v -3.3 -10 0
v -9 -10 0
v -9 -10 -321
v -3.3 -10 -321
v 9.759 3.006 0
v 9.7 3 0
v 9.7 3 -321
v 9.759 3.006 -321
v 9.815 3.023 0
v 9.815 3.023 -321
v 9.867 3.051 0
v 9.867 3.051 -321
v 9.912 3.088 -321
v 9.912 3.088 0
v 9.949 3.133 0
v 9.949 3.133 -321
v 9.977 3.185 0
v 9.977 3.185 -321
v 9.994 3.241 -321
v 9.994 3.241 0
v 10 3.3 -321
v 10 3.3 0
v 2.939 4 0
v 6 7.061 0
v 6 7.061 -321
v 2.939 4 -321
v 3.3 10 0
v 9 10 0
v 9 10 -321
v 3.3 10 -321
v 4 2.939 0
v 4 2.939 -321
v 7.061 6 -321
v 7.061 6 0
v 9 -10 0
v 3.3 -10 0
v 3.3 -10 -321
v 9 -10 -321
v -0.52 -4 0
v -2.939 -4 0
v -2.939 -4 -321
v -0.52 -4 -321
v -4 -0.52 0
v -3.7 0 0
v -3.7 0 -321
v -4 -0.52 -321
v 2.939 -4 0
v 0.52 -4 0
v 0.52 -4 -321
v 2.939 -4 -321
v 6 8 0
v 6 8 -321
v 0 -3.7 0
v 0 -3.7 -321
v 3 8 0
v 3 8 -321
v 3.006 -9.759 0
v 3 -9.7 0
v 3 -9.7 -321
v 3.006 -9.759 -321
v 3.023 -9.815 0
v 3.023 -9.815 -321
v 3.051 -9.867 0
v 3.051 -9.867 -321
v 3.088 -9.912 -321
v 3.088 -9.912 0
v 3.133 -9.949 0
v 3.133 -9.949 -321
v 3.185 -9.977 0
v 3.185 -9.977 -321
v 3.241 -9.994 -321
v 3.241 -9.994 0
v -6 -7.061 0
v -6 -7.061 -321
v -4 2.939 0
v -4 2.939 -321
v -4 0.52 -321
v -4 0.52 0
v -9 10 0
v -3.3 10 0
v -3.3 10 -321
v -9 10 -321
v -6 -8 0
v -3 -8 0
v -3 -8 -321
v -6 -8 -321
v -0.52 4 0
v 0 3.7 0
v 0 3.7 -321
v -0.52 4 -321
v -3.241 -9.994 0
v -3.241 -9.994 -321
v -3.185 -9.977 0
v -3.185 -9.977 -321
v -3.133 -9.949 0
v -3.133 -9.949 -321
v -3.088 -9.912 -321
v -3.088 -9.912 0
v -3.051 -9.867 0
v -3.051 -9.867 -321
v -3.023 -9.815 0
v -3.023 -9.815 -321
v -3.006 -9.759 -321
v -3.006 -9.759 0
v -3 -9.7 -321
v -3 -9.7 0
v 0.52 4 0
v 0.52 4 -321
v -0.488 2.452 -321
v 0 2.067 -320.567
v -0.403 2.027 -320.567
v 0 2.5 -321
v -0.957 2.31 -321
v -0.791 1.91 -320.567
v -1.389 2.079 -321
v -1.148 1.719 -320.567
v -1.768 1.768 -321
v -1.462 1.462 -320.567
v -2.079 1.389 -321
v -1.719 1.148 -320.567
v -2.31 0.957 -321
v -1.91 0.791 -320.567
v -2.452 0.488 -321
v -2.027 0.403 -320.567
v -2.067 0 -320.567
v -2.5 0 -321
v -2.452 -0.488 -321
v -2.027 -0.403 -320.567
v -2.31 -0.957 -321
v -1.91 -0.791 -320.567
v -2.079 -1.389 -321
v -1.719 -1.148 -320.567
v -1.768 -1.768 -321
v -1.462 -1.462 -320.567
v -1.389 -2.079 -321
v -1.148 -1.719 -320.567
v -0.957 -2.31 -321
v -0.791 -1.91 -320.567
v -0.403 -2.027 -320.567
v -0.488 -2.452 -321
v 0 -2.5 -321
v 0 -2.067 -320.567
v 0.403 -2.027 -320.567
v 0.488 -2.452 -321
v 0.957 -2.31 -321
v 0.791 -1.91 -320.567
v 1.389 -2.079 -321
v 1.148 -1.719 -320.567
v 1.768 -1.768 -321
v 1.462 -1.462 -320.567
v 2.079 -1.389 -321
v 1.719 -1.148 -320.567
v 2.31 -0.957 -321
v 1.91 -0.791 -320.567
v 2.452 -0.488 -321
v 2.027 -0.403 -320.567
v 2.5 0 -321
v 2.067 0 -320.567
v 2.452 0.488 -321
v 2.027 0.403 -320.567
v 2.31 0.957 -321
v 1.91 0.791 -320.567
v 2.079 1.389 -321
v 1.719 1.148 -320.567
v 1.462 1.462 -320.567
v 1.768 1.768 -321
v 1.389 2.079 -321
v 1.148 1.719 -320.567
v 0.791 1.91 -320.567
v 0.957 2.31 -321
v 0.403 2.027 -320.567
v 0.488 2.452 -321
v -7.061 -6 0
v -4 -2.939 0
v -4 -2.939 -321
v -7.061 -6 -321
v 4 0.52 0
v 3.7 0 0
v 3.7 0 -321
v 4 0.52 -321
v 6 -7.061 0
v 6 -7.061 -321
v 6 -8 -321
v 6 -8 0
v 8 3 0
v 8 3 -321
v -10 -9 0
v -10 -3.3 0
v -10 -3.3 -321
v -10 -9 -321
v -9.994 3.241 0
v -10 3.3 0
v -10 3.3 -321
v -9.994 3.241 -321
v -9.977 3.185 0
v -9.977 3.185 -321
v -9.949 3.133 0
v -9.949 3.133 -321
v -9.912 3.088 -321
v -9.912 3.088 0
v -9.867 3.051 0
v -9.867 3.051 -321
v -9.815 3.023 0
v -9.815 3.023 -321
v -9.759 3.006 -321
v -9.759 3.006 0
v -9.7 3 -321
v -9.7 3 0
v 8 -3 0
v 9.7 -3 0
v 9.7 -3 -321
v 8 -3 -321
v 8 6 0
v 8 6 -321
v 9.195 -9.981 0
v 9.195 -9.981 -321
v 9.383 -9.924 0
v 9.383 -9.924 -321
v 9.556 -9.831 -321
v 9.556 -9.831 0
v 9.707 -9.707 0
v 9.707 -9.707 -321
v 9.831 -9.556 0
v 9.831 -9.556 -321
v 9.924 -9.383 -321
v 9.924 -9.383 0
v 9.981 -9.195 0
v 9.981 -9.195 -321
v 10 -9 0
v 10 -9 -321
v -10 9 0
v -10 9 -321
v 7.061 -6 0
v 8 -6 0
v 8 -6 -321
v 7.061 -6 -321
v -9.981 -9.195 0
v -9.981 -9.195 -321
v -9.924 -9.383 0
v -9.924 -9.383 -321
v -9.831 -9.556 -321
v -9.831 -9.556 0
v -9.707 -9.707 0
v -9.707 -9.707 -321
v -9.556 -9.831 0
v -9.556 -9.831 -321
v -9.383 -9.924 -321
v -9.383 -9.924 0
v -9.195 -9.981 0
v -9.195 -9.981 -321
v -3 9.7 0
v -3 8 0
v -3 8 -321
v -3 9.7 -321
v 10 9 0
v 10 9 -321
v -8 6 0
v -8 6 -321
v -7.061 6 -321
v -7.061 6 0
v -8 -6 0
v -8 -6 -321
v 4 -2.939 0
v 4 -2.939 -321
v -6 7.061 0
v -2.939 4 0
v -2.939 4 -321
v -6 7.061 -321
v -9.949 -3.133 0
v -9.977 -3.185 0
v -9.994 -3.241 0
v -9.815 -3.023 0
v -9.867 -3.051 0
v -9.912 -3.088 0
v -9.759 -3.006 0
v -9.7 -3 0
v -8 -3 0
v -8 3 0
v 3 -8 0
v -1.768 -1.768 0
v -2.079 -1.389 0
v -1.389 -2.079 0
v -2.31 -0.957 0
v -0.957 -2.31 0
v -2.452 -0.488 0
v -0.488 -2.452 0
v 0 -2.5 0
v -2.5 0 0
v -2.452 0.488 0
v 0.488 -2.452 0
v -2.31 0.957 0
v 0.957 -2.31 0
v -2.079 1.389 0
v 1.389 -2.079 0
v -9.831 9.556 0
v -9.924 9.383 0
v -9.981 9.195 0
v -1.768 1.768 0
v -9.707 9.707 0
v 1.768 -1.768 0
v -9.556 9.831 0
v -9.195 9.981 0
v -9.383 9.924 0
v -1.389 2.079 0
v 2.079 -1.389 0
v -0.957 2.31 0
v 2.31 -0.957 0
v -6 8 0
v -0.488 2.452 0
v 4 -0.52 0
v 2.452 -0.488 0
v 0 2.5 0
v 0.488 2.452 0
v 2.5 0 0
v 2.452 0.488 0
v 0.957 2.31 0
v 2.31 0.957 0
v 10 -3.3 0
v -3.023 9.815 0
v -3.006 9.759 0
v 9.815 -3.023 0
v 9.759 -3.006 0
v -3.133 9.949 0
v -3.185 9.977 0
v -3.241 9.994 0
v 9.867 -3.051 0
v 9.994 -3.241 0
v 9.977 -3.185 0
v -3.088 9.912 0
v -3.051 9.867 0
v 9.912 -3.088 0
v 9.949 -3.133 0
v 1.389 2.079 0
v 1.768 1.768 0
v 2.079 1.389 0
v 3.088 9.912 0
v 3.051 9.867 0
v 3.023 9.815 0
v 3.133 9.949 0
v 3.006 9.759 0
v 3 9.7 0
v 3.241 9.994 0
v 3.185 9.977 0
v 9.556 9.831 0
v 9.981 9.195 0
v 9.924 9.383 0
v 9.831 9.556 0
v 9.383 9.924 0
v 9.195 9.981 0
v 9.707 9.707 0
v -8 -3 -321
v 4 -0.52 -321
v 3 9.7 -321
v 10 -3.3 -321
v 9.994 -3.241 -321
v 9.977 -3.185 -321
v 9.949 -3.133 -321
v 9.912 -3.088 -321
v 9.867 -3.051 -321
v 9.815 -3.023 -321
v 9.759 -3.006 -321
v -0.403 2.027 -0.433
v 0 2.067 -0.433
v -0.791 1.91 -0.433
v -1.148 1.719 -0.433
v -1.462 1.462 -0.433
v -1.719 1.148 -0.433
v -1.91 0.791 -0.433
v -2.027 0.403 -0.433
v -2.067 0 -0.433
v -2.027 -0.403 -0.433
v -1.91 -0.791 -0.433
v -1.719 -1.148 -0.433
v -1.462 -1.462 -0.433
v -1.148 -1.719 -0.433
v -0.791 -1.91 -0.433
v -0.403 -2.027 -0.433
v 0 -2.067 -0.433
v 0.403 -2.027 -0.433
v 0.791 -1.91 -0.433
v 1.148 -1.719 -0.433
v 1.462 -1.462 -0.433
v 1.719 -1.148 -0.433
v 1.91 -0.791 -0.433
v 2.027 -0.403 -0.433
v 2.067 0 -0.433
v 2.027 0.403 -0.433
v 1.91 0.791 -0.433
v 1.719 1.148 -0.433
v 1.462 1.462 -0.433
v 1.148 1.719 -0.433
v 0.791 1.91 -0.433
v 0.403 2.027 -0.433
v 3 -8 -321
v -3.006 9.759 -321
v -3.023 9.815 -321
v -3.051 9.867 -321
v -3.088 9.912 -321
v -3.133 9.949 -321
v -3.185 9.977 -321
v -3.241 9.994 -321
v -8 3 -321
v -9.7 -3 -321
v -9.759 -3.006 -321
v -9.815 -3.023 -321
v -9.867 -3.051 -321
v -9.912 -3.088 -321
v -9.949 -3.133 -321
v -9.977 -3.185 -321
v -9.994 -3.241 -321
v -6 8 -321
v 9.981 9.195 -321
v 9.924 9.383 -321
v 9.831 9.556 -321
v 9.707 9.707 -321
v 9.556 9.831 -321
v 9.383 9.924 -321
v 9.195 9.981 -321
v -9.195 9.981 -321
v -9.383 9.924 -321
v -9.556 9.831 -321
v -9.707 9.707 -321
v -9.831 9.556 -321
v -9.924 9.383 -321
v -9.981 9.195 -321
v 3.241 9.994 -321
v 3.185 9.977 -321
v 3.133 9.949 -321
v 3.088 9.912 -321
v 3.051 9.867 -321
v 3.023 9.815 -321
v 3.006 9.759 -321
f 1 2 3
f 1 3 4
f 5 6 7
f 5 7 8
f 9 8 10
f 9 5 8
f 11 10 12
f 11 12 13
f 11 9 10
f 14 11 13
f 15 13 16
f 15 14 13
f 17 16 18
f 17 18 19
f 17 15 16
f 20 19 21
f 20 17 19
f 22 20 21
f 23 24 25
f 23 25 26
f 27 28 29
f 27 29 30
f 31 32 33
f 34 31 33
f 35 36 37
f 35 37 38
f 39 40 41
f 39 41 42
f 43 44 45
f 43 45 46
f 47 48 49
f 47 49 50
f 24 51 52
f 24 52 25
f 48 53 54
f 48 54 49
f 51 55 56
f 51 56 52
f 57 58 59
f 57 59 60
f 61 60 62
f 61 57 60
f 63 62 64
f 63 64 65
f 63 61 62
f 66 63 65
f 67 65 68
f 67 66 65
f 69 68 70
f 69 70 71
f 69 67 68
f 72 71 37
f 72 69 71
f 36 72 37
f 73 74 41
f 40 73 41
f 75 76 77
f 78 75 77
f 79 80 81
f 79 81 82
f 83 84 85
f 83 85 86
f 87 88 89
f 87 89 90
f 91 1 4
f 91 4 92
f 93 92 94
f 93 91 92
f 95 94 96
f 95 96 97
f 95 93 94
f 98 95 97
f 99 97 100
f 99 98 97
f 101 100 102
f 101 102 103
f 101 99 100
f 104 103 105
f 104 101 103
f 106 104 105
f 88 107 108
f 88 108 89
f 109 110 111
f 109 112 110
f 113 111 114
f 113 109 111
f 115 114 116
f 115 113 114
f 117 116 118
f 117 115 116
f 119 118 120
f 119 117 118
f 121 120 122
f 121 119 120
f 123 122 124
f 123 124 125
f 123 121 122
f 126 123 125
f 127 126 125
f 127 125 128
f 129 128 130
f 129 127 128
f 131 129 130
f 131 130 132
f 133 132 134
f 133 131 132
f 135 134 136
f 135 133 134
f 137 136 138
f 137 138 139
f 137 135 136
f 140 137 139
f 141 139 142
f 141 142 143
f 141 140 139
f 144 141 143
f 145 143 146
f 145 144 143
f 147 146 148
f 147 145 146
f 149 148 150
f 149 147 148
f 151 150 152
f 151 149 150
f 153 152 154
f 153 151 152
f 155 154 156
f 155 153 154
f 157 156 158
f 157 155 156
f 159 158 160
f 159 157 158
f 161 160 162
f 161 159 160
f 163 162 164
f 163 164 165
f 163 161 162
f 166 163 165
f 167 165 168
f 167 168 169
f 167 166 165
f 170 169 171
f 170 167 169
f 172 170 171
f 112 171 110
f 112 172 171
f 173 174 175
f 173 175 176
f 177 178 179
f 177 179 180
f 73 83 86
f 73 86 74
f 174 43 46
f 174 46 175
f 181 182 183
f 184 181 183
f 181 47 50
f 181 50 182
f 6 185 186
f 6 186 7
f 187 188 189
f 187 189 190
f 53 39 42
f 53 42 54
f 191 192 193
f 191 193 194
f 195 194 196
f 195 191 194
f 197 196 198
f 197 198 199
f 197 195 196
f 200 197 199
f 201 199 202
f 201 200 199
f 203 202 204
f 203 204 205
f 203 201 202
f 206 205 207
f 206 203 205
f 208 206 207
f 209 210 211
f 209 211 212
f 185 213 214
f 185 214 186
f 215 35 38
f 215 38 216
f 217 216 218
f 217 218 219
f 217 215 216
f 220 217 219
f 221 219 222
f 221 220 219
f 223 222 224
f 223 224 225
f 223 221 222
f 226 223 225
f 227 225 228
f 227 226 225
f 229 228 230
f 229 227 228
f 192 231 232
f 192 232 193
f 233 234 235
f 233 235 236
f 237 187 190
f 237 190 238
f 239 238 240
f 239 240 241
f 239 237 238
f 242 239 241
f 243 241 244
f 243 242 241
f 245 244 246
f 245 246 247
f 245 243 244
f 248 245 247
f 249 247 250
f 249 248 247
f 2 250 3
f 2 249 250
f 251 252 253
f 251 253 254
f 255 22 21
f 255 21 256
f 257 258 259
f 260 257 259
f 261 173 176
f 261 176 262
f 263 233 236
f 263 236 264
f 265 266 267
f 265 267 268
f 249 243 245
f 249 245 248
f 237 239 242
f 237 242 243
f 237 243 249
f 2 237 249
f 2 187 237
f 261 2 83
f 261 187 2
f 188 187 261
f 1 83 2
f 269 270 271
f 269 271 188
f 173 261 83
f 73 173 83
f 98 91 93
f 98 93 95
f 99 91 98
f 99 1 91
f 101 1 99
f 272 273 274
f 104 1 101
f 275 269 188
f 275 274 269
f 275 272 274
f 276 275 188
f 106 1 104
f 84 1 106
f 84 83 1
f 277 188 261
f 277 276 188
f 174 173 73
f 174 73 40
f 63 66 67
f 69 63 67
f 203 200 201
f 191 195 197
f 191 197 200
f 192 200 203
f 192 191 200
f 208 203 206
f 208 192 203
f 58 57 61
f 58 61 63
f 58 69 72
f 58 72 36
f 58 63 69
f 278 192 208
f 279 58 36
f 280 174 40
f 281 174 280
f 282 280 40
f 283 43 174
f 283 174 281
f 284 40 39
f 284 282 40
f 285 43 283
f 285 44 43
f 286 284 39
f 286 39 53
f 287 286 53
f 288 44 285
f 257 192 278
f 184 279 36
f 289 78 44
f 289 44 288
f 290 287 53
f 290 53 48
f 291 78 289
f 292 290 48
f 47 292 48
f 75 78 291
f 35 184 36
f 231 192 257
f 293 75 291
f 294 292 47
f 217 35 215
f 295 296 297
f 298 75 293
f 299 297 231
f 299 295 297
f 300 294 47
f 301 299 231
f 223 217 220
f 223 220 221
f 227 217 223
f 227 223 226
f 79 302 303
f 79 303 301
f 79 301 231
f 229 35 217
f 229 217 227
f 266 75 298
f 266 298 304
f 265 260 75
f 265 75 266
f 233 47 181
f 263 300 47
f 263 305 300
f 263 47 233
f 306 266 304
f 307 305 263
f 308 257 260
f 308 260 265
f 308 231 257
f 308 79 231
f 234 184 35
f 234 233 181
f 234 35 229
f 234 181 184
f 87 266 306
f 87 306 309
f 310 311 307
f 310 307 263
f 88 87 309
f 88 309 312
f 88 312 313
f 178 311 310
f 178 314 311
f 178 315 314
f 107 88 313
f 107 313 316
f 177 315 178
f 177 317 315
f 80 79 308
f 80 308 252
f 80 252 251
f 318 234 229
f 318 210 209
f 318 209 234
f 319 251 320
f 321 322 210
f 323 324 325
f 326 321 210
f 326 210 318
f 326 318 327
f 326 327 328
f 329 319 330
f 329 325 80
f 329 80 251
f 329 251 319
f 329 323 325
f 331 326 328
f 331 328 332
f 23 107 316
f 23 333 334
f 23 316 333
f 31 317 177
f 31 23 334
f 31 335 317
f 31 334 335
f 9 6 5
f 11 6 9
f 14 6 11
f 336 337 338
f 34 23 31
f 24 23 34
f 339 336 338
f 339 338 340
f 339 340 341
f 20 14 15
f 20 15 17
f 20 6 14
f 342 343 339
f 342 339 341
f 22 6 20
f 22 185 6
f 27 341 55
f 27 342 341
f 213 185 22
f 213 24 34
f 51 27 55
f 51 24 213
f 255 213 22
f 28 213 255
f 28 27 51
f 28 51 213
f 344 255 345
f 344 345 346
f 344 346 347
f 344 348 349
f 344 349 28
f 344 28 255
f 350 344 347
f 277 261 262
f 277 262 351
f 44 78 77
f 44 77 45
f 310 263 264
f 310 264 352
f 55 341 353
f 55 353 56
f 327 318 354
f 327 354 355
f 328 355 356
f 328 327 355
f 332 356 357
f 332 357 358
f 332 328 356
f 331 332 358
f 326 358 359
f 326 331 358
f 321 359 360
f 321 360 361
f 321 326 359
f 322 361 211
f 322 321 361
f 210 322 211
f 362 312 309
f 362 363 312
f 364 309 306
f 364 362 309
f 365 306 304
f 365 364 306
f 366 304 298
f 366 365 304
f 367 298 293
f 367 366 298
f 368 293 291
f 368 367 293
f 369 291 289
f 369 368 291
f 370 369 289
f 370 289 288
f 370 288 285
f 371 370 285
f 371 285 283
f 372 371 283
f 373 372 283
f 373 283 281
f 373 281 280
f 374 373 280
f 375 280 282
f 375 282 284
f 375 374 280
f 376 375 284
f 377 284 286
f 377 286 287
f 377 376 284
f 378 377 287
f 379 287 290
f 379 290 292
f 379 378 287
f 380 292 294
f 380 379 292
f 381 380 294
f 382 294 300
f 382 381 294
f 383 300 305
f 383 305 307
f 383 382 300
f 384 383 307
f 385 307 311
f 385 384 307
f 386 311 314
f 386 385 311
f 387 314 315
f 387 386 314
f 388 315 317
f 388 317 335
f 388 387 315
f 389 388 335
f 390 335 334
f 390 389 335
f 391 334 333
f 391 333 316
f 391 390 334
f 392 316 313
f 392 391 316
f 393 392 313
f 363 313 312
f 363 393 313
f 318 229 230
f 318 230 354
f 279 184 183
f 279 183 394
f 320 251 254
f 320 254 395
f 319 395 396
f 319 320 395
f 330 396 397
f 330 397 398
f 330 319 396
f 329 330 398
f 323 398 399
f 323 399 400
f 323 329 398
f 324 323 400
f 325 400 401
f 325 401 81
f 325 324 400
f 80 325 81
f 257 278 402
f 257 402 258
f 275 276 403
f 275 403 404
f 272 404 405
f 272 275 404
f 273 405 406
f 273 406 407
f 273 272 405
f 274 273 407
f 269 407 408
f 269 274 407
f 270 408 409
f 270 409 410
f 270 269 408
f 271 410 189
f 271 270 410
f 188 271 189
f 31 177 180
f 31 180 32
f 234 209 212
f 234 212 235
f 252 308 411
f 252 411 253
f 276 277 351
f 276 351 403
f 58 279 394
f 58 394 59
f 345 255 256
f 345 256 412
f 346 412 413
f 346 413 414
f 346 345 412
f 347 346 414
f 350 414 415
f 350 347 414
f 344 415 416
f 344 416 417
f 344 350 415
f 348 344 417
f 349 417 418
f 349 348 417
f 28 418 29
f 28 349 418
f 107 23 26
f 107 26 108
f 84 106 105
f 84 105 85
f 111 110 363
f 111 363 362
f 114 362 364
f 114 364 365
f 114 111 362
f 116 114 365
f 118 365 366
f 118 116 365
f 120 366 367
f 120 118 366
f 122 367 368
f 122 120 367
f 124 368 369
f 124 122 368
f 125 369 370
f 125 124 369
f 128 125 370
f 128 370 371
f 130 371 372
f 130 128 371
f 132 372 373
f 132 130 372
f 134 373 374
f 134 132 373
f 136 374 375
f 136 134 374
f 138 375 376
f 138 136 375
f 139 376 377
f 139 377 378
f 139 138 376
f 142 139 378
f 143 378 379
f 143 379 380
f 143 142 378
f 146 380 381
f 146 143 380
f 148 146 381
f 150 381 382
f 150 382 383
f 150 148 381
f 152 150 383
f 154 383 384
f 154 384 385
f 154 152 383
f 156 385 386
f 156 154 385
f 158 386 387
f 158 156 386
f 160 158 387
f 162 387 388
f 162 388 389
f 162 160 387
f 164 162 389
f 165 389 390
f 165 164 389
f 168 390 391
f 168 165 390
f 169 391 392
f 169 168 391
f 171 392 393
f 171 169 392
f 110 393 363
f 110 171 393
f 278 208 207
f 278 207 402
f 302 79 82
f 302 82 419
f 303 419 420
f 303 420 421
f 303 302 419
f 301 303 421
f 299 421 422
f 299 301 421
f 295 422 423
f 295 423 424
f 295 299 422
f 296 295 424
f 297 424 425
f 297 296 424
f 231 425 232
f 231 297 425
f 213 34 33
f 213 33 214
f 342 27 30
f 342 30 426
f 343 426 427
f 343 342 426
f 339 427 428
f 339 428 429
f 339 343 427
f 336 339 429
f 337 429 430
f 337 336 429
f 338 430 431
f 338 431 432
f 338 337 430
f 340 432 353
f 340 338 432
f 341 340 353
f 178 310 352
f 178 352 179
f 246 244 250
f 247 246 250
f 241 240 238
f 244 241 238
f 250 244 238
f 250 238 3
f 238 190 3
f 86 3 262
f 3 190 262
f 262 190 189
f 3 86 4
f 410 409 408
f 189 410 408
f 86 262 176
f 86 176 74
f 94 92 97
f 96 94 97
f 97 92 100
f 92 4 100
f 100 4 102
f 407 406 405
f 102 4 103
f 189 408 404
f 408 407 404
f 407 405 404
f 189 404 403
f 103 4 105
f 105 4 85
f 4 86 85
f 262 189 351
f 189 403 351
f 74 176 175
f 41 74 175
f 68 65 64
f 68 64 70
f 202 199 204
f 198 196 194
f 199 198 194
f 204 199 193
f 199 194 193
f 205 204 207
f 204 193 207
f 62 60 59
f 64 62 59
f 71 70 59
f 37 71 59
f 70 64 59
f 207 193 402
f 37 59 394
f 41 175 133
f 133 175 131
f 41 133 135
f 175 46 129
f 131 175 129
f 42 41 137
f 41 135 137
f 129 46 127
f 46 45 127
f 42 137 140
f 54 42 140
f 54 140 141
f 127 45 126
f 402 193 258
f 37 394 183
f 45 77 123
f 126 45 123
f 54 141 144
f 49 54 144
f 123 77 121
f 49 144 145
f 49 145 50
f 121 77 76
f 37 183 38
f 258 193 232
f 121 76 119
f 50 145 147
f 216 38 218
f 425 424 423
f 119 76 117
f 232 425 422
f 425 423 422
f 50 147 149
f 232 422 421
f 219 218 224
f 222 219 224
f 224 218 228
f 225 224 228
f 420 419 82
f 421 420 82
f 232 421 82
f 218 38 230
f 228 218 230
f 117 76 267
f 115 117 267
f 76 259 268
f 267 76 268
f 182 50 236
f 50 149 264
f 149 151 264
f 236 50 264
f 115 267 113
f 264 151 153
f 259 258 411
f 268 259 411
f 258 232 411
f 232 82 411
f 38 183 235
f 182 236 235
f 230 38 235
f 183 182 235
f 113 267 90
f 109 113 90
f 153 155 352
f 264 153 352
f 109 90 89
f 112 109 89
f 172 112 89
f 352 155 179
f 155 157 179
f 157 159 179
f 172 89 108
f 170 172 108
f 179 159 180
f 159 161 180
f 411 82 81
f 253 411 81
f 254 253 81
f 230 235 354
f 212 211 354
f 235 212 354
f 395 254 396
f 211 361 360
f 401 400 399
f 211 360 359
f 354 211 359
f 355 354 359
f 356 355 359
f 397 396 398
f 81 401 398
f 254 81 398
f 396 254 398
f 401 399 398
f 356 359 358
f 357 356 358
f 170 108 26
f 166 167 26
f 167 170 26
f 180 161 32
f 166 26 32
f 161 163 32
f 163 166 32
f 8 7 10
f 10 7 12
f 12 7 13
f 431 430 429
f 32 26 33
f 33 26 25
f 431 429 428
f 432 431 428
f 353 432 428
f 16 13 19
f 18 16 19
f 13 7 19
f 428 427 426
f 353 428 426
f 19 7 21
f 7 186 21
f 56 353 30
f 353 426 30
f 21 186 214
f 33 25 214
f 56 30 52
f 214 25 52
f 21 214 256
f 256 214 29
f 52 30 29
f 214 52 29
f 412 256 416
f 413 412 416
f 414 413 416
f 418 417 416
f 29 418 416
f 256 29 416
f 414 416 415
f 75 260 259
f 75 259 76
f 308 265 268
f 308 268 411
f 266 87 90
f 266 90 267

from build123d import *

# Parameters (mm, degrees)
BOSS_EXTRUDE1_DEPTH = 321


with BuildPart() as part:
    # Sketch1 → Boss-Extrude1 (new body)
    with BuildSketch(Plane.XY):
        with BuildLine():
            Line((-10, 9), (-10, 3.29999995))
            ThreePointArc((-10, 3.29999995), (-9.912132049, 3.087867916), (-9.7, 3))
            Line((-9.7, 3), (-8, 3))
            Line((-8, 3), (-8, 6))
            Line((-8, 6), (-7.060677, 6))
            Line((-7.060677, 6), (-4, 2.93932965))
            Line((-4, 2.93932965), (-4, 0.519615242))
            Line((-4, 0.519615242), (-3.699996283, -6.437e-06))
            Line((-3.699996283, -6.437e-06), (-4, -0.519628117))
            Line((-4, -0.519628117), (-4, -2.93933725))
            Line((-4, -2.93933725), (-7.0606695, -6))
            Line((-7.0606695, -6), (-8, -6))
            Line((-8, -6), (-8, -3))
            Line((-8, -3), (-9.7, -3))
            ThreePointArc((-9.7, -3), (-9.912132049, -3.087867916), (-10, -3.29999995))
            Line((-10, -3.29999995), (-10, -9))
            ThreePointArc((-10, -9), (-9.707106781, -9.707106781), (-9, -10))
            Line((-9, -10), (-3.29999995, -10))
            ThreePointArc((-3.29999995, -10), (-3.087867916, -9.912132049), (-3, -9.7))
            Line((-3, -9.7), (-3, -8))
            Line((-3, -8), (-6, -8))
            Line((-6, -8), (-6, -7.0606515))
            Line((-6, -7.0606515), (-2.9393489, -4))
            Line((-2.9393489, -4), (-0.519615242, -4))
            Line((-0.519615242, -4), (6.437e-06, -3.699996283))
            Line((6.437e-06, -3.699996283), (0.519628117, -4))
            Line((0.519628117, -4), (2.9393227, -4))
            Line((2.9393227, -4), (6, -7.060677))
            Line((6, -7.060677), (6, -8))
            Line((6, -8), (3, -8))
            Line((3, -8), (3, -9.7))
            ThreePointArc((3, -9.7), (3.087867916, -9.912132049), (3.29999995, -10))
            Line((3.29999995, -10), (9, -10))
            ThreePointArc((9, -10), (9.707106781, -9.707106781), (10, -9))
            Line((10, -9), (10, -3.29999995))
            ThreePointArc((10, -3.29999995), (9.912132049, -3.087867916), (9.7, -3))
            Line((9.7, -3), (8, -3))
            Line((8, -3), (8, -6))
            Line((8, -6), (7.0606435, -6))
            Line((7.0606435, -6), (4, -2.9393482))
            Line((4, -2.9393482), (4, -0.519615242))
            Line((4, -0.519615242), (3.699996283, 6.437e-06))
            Line((3.699996283, 6.437e-06), (4, 0.519628117))
            Line((4, 0.519628117), (4, 2.9393401))
            Line((4, 2.9393401), (7.060651, 6))
            Line((7.060651, 6), (8, 6))
            Line((8, 6), (8, 3))
            Line((8, 3), (9.7, 3))
            ThreePointArc((9.7, 3), (9.912132049, 3.087867916), (10, 3.29999995))
            Line((10, 3.29999995), (10, 9))
            ThreePointArc((10, 9), (9.707106781, 9.707106781), (9, 10))
            Line((9, 10), (3.29999995, 10))
            ThreePointArc((3.29999995, 10), (3.087867916, 9.912132049), (3, 9.7))
            Line((3, 9.7), (3, 8))
            Line((3, 8), (6, 8))
            Line((6, 8), (6, 7.060669))
            Line((6, 7.060669), (2.9393308, 4))
            Line((2.9393308, 4), (0.519615242, 4))
            Line((0.519615242, 4), (-6.437e-06, 3.699996283))
            Line((-6.437e-06, 3.699996283), (-0.519628117, 4))
            Line((-0.519628117, 4), (-2.93935655, 4))
            Line((-2.93935655, 4), (-6, 7.0606435))
            Line((-6, 7.0606435), (-6, 8))
            Line((-6, 8), (-3, 8))
            Line((-3, 8), (-3, 9.7))
            ThreePointArc((-3, 9.7), (-3.087867966, 9.912132034), (-3.3, 10))
            Line((-3.3, 10), (-9, 10))
            ThreePointArc((-9, 10), (-9.707106781, 9.707106781), (-10, 9))
        make_face()
    extrude(amount=-BOSS_EXTRUDE1_DEPTH)

    # Sketch2 → Cut-Revolve1 (revolve, cut)
    with BuildSketch(Plane(origin=(0, 0, 0), x_dir=(0, 0, -1), z_dir=(1, 0, 0))):
        Polygon((0, 0), (0, 2.5), (0.433, 2.067), (321, 2.067), (321, 0), align=None)
    revolve(axis=Axis((0, 0, -321), (0, 0, 1)), mode=Mode.SUBTRACT)

    # Sketch3 → Cut-Revolve2 (revolve, cut)
    with BuildSketch(Plane(origin=(0, 0, 0), x_dir=(0, 0, -1), z_dir=(1, 0, 0))):
        Polygon((0, 0), (0, 2.067), (320.567, 2.067), (321, 2.5), (321, 0), align=None)
    revolve(axis=Axis((0, 0, -321), (0, 0, 1)), mode=Mode.SUBTRACT)


solid = part.part
